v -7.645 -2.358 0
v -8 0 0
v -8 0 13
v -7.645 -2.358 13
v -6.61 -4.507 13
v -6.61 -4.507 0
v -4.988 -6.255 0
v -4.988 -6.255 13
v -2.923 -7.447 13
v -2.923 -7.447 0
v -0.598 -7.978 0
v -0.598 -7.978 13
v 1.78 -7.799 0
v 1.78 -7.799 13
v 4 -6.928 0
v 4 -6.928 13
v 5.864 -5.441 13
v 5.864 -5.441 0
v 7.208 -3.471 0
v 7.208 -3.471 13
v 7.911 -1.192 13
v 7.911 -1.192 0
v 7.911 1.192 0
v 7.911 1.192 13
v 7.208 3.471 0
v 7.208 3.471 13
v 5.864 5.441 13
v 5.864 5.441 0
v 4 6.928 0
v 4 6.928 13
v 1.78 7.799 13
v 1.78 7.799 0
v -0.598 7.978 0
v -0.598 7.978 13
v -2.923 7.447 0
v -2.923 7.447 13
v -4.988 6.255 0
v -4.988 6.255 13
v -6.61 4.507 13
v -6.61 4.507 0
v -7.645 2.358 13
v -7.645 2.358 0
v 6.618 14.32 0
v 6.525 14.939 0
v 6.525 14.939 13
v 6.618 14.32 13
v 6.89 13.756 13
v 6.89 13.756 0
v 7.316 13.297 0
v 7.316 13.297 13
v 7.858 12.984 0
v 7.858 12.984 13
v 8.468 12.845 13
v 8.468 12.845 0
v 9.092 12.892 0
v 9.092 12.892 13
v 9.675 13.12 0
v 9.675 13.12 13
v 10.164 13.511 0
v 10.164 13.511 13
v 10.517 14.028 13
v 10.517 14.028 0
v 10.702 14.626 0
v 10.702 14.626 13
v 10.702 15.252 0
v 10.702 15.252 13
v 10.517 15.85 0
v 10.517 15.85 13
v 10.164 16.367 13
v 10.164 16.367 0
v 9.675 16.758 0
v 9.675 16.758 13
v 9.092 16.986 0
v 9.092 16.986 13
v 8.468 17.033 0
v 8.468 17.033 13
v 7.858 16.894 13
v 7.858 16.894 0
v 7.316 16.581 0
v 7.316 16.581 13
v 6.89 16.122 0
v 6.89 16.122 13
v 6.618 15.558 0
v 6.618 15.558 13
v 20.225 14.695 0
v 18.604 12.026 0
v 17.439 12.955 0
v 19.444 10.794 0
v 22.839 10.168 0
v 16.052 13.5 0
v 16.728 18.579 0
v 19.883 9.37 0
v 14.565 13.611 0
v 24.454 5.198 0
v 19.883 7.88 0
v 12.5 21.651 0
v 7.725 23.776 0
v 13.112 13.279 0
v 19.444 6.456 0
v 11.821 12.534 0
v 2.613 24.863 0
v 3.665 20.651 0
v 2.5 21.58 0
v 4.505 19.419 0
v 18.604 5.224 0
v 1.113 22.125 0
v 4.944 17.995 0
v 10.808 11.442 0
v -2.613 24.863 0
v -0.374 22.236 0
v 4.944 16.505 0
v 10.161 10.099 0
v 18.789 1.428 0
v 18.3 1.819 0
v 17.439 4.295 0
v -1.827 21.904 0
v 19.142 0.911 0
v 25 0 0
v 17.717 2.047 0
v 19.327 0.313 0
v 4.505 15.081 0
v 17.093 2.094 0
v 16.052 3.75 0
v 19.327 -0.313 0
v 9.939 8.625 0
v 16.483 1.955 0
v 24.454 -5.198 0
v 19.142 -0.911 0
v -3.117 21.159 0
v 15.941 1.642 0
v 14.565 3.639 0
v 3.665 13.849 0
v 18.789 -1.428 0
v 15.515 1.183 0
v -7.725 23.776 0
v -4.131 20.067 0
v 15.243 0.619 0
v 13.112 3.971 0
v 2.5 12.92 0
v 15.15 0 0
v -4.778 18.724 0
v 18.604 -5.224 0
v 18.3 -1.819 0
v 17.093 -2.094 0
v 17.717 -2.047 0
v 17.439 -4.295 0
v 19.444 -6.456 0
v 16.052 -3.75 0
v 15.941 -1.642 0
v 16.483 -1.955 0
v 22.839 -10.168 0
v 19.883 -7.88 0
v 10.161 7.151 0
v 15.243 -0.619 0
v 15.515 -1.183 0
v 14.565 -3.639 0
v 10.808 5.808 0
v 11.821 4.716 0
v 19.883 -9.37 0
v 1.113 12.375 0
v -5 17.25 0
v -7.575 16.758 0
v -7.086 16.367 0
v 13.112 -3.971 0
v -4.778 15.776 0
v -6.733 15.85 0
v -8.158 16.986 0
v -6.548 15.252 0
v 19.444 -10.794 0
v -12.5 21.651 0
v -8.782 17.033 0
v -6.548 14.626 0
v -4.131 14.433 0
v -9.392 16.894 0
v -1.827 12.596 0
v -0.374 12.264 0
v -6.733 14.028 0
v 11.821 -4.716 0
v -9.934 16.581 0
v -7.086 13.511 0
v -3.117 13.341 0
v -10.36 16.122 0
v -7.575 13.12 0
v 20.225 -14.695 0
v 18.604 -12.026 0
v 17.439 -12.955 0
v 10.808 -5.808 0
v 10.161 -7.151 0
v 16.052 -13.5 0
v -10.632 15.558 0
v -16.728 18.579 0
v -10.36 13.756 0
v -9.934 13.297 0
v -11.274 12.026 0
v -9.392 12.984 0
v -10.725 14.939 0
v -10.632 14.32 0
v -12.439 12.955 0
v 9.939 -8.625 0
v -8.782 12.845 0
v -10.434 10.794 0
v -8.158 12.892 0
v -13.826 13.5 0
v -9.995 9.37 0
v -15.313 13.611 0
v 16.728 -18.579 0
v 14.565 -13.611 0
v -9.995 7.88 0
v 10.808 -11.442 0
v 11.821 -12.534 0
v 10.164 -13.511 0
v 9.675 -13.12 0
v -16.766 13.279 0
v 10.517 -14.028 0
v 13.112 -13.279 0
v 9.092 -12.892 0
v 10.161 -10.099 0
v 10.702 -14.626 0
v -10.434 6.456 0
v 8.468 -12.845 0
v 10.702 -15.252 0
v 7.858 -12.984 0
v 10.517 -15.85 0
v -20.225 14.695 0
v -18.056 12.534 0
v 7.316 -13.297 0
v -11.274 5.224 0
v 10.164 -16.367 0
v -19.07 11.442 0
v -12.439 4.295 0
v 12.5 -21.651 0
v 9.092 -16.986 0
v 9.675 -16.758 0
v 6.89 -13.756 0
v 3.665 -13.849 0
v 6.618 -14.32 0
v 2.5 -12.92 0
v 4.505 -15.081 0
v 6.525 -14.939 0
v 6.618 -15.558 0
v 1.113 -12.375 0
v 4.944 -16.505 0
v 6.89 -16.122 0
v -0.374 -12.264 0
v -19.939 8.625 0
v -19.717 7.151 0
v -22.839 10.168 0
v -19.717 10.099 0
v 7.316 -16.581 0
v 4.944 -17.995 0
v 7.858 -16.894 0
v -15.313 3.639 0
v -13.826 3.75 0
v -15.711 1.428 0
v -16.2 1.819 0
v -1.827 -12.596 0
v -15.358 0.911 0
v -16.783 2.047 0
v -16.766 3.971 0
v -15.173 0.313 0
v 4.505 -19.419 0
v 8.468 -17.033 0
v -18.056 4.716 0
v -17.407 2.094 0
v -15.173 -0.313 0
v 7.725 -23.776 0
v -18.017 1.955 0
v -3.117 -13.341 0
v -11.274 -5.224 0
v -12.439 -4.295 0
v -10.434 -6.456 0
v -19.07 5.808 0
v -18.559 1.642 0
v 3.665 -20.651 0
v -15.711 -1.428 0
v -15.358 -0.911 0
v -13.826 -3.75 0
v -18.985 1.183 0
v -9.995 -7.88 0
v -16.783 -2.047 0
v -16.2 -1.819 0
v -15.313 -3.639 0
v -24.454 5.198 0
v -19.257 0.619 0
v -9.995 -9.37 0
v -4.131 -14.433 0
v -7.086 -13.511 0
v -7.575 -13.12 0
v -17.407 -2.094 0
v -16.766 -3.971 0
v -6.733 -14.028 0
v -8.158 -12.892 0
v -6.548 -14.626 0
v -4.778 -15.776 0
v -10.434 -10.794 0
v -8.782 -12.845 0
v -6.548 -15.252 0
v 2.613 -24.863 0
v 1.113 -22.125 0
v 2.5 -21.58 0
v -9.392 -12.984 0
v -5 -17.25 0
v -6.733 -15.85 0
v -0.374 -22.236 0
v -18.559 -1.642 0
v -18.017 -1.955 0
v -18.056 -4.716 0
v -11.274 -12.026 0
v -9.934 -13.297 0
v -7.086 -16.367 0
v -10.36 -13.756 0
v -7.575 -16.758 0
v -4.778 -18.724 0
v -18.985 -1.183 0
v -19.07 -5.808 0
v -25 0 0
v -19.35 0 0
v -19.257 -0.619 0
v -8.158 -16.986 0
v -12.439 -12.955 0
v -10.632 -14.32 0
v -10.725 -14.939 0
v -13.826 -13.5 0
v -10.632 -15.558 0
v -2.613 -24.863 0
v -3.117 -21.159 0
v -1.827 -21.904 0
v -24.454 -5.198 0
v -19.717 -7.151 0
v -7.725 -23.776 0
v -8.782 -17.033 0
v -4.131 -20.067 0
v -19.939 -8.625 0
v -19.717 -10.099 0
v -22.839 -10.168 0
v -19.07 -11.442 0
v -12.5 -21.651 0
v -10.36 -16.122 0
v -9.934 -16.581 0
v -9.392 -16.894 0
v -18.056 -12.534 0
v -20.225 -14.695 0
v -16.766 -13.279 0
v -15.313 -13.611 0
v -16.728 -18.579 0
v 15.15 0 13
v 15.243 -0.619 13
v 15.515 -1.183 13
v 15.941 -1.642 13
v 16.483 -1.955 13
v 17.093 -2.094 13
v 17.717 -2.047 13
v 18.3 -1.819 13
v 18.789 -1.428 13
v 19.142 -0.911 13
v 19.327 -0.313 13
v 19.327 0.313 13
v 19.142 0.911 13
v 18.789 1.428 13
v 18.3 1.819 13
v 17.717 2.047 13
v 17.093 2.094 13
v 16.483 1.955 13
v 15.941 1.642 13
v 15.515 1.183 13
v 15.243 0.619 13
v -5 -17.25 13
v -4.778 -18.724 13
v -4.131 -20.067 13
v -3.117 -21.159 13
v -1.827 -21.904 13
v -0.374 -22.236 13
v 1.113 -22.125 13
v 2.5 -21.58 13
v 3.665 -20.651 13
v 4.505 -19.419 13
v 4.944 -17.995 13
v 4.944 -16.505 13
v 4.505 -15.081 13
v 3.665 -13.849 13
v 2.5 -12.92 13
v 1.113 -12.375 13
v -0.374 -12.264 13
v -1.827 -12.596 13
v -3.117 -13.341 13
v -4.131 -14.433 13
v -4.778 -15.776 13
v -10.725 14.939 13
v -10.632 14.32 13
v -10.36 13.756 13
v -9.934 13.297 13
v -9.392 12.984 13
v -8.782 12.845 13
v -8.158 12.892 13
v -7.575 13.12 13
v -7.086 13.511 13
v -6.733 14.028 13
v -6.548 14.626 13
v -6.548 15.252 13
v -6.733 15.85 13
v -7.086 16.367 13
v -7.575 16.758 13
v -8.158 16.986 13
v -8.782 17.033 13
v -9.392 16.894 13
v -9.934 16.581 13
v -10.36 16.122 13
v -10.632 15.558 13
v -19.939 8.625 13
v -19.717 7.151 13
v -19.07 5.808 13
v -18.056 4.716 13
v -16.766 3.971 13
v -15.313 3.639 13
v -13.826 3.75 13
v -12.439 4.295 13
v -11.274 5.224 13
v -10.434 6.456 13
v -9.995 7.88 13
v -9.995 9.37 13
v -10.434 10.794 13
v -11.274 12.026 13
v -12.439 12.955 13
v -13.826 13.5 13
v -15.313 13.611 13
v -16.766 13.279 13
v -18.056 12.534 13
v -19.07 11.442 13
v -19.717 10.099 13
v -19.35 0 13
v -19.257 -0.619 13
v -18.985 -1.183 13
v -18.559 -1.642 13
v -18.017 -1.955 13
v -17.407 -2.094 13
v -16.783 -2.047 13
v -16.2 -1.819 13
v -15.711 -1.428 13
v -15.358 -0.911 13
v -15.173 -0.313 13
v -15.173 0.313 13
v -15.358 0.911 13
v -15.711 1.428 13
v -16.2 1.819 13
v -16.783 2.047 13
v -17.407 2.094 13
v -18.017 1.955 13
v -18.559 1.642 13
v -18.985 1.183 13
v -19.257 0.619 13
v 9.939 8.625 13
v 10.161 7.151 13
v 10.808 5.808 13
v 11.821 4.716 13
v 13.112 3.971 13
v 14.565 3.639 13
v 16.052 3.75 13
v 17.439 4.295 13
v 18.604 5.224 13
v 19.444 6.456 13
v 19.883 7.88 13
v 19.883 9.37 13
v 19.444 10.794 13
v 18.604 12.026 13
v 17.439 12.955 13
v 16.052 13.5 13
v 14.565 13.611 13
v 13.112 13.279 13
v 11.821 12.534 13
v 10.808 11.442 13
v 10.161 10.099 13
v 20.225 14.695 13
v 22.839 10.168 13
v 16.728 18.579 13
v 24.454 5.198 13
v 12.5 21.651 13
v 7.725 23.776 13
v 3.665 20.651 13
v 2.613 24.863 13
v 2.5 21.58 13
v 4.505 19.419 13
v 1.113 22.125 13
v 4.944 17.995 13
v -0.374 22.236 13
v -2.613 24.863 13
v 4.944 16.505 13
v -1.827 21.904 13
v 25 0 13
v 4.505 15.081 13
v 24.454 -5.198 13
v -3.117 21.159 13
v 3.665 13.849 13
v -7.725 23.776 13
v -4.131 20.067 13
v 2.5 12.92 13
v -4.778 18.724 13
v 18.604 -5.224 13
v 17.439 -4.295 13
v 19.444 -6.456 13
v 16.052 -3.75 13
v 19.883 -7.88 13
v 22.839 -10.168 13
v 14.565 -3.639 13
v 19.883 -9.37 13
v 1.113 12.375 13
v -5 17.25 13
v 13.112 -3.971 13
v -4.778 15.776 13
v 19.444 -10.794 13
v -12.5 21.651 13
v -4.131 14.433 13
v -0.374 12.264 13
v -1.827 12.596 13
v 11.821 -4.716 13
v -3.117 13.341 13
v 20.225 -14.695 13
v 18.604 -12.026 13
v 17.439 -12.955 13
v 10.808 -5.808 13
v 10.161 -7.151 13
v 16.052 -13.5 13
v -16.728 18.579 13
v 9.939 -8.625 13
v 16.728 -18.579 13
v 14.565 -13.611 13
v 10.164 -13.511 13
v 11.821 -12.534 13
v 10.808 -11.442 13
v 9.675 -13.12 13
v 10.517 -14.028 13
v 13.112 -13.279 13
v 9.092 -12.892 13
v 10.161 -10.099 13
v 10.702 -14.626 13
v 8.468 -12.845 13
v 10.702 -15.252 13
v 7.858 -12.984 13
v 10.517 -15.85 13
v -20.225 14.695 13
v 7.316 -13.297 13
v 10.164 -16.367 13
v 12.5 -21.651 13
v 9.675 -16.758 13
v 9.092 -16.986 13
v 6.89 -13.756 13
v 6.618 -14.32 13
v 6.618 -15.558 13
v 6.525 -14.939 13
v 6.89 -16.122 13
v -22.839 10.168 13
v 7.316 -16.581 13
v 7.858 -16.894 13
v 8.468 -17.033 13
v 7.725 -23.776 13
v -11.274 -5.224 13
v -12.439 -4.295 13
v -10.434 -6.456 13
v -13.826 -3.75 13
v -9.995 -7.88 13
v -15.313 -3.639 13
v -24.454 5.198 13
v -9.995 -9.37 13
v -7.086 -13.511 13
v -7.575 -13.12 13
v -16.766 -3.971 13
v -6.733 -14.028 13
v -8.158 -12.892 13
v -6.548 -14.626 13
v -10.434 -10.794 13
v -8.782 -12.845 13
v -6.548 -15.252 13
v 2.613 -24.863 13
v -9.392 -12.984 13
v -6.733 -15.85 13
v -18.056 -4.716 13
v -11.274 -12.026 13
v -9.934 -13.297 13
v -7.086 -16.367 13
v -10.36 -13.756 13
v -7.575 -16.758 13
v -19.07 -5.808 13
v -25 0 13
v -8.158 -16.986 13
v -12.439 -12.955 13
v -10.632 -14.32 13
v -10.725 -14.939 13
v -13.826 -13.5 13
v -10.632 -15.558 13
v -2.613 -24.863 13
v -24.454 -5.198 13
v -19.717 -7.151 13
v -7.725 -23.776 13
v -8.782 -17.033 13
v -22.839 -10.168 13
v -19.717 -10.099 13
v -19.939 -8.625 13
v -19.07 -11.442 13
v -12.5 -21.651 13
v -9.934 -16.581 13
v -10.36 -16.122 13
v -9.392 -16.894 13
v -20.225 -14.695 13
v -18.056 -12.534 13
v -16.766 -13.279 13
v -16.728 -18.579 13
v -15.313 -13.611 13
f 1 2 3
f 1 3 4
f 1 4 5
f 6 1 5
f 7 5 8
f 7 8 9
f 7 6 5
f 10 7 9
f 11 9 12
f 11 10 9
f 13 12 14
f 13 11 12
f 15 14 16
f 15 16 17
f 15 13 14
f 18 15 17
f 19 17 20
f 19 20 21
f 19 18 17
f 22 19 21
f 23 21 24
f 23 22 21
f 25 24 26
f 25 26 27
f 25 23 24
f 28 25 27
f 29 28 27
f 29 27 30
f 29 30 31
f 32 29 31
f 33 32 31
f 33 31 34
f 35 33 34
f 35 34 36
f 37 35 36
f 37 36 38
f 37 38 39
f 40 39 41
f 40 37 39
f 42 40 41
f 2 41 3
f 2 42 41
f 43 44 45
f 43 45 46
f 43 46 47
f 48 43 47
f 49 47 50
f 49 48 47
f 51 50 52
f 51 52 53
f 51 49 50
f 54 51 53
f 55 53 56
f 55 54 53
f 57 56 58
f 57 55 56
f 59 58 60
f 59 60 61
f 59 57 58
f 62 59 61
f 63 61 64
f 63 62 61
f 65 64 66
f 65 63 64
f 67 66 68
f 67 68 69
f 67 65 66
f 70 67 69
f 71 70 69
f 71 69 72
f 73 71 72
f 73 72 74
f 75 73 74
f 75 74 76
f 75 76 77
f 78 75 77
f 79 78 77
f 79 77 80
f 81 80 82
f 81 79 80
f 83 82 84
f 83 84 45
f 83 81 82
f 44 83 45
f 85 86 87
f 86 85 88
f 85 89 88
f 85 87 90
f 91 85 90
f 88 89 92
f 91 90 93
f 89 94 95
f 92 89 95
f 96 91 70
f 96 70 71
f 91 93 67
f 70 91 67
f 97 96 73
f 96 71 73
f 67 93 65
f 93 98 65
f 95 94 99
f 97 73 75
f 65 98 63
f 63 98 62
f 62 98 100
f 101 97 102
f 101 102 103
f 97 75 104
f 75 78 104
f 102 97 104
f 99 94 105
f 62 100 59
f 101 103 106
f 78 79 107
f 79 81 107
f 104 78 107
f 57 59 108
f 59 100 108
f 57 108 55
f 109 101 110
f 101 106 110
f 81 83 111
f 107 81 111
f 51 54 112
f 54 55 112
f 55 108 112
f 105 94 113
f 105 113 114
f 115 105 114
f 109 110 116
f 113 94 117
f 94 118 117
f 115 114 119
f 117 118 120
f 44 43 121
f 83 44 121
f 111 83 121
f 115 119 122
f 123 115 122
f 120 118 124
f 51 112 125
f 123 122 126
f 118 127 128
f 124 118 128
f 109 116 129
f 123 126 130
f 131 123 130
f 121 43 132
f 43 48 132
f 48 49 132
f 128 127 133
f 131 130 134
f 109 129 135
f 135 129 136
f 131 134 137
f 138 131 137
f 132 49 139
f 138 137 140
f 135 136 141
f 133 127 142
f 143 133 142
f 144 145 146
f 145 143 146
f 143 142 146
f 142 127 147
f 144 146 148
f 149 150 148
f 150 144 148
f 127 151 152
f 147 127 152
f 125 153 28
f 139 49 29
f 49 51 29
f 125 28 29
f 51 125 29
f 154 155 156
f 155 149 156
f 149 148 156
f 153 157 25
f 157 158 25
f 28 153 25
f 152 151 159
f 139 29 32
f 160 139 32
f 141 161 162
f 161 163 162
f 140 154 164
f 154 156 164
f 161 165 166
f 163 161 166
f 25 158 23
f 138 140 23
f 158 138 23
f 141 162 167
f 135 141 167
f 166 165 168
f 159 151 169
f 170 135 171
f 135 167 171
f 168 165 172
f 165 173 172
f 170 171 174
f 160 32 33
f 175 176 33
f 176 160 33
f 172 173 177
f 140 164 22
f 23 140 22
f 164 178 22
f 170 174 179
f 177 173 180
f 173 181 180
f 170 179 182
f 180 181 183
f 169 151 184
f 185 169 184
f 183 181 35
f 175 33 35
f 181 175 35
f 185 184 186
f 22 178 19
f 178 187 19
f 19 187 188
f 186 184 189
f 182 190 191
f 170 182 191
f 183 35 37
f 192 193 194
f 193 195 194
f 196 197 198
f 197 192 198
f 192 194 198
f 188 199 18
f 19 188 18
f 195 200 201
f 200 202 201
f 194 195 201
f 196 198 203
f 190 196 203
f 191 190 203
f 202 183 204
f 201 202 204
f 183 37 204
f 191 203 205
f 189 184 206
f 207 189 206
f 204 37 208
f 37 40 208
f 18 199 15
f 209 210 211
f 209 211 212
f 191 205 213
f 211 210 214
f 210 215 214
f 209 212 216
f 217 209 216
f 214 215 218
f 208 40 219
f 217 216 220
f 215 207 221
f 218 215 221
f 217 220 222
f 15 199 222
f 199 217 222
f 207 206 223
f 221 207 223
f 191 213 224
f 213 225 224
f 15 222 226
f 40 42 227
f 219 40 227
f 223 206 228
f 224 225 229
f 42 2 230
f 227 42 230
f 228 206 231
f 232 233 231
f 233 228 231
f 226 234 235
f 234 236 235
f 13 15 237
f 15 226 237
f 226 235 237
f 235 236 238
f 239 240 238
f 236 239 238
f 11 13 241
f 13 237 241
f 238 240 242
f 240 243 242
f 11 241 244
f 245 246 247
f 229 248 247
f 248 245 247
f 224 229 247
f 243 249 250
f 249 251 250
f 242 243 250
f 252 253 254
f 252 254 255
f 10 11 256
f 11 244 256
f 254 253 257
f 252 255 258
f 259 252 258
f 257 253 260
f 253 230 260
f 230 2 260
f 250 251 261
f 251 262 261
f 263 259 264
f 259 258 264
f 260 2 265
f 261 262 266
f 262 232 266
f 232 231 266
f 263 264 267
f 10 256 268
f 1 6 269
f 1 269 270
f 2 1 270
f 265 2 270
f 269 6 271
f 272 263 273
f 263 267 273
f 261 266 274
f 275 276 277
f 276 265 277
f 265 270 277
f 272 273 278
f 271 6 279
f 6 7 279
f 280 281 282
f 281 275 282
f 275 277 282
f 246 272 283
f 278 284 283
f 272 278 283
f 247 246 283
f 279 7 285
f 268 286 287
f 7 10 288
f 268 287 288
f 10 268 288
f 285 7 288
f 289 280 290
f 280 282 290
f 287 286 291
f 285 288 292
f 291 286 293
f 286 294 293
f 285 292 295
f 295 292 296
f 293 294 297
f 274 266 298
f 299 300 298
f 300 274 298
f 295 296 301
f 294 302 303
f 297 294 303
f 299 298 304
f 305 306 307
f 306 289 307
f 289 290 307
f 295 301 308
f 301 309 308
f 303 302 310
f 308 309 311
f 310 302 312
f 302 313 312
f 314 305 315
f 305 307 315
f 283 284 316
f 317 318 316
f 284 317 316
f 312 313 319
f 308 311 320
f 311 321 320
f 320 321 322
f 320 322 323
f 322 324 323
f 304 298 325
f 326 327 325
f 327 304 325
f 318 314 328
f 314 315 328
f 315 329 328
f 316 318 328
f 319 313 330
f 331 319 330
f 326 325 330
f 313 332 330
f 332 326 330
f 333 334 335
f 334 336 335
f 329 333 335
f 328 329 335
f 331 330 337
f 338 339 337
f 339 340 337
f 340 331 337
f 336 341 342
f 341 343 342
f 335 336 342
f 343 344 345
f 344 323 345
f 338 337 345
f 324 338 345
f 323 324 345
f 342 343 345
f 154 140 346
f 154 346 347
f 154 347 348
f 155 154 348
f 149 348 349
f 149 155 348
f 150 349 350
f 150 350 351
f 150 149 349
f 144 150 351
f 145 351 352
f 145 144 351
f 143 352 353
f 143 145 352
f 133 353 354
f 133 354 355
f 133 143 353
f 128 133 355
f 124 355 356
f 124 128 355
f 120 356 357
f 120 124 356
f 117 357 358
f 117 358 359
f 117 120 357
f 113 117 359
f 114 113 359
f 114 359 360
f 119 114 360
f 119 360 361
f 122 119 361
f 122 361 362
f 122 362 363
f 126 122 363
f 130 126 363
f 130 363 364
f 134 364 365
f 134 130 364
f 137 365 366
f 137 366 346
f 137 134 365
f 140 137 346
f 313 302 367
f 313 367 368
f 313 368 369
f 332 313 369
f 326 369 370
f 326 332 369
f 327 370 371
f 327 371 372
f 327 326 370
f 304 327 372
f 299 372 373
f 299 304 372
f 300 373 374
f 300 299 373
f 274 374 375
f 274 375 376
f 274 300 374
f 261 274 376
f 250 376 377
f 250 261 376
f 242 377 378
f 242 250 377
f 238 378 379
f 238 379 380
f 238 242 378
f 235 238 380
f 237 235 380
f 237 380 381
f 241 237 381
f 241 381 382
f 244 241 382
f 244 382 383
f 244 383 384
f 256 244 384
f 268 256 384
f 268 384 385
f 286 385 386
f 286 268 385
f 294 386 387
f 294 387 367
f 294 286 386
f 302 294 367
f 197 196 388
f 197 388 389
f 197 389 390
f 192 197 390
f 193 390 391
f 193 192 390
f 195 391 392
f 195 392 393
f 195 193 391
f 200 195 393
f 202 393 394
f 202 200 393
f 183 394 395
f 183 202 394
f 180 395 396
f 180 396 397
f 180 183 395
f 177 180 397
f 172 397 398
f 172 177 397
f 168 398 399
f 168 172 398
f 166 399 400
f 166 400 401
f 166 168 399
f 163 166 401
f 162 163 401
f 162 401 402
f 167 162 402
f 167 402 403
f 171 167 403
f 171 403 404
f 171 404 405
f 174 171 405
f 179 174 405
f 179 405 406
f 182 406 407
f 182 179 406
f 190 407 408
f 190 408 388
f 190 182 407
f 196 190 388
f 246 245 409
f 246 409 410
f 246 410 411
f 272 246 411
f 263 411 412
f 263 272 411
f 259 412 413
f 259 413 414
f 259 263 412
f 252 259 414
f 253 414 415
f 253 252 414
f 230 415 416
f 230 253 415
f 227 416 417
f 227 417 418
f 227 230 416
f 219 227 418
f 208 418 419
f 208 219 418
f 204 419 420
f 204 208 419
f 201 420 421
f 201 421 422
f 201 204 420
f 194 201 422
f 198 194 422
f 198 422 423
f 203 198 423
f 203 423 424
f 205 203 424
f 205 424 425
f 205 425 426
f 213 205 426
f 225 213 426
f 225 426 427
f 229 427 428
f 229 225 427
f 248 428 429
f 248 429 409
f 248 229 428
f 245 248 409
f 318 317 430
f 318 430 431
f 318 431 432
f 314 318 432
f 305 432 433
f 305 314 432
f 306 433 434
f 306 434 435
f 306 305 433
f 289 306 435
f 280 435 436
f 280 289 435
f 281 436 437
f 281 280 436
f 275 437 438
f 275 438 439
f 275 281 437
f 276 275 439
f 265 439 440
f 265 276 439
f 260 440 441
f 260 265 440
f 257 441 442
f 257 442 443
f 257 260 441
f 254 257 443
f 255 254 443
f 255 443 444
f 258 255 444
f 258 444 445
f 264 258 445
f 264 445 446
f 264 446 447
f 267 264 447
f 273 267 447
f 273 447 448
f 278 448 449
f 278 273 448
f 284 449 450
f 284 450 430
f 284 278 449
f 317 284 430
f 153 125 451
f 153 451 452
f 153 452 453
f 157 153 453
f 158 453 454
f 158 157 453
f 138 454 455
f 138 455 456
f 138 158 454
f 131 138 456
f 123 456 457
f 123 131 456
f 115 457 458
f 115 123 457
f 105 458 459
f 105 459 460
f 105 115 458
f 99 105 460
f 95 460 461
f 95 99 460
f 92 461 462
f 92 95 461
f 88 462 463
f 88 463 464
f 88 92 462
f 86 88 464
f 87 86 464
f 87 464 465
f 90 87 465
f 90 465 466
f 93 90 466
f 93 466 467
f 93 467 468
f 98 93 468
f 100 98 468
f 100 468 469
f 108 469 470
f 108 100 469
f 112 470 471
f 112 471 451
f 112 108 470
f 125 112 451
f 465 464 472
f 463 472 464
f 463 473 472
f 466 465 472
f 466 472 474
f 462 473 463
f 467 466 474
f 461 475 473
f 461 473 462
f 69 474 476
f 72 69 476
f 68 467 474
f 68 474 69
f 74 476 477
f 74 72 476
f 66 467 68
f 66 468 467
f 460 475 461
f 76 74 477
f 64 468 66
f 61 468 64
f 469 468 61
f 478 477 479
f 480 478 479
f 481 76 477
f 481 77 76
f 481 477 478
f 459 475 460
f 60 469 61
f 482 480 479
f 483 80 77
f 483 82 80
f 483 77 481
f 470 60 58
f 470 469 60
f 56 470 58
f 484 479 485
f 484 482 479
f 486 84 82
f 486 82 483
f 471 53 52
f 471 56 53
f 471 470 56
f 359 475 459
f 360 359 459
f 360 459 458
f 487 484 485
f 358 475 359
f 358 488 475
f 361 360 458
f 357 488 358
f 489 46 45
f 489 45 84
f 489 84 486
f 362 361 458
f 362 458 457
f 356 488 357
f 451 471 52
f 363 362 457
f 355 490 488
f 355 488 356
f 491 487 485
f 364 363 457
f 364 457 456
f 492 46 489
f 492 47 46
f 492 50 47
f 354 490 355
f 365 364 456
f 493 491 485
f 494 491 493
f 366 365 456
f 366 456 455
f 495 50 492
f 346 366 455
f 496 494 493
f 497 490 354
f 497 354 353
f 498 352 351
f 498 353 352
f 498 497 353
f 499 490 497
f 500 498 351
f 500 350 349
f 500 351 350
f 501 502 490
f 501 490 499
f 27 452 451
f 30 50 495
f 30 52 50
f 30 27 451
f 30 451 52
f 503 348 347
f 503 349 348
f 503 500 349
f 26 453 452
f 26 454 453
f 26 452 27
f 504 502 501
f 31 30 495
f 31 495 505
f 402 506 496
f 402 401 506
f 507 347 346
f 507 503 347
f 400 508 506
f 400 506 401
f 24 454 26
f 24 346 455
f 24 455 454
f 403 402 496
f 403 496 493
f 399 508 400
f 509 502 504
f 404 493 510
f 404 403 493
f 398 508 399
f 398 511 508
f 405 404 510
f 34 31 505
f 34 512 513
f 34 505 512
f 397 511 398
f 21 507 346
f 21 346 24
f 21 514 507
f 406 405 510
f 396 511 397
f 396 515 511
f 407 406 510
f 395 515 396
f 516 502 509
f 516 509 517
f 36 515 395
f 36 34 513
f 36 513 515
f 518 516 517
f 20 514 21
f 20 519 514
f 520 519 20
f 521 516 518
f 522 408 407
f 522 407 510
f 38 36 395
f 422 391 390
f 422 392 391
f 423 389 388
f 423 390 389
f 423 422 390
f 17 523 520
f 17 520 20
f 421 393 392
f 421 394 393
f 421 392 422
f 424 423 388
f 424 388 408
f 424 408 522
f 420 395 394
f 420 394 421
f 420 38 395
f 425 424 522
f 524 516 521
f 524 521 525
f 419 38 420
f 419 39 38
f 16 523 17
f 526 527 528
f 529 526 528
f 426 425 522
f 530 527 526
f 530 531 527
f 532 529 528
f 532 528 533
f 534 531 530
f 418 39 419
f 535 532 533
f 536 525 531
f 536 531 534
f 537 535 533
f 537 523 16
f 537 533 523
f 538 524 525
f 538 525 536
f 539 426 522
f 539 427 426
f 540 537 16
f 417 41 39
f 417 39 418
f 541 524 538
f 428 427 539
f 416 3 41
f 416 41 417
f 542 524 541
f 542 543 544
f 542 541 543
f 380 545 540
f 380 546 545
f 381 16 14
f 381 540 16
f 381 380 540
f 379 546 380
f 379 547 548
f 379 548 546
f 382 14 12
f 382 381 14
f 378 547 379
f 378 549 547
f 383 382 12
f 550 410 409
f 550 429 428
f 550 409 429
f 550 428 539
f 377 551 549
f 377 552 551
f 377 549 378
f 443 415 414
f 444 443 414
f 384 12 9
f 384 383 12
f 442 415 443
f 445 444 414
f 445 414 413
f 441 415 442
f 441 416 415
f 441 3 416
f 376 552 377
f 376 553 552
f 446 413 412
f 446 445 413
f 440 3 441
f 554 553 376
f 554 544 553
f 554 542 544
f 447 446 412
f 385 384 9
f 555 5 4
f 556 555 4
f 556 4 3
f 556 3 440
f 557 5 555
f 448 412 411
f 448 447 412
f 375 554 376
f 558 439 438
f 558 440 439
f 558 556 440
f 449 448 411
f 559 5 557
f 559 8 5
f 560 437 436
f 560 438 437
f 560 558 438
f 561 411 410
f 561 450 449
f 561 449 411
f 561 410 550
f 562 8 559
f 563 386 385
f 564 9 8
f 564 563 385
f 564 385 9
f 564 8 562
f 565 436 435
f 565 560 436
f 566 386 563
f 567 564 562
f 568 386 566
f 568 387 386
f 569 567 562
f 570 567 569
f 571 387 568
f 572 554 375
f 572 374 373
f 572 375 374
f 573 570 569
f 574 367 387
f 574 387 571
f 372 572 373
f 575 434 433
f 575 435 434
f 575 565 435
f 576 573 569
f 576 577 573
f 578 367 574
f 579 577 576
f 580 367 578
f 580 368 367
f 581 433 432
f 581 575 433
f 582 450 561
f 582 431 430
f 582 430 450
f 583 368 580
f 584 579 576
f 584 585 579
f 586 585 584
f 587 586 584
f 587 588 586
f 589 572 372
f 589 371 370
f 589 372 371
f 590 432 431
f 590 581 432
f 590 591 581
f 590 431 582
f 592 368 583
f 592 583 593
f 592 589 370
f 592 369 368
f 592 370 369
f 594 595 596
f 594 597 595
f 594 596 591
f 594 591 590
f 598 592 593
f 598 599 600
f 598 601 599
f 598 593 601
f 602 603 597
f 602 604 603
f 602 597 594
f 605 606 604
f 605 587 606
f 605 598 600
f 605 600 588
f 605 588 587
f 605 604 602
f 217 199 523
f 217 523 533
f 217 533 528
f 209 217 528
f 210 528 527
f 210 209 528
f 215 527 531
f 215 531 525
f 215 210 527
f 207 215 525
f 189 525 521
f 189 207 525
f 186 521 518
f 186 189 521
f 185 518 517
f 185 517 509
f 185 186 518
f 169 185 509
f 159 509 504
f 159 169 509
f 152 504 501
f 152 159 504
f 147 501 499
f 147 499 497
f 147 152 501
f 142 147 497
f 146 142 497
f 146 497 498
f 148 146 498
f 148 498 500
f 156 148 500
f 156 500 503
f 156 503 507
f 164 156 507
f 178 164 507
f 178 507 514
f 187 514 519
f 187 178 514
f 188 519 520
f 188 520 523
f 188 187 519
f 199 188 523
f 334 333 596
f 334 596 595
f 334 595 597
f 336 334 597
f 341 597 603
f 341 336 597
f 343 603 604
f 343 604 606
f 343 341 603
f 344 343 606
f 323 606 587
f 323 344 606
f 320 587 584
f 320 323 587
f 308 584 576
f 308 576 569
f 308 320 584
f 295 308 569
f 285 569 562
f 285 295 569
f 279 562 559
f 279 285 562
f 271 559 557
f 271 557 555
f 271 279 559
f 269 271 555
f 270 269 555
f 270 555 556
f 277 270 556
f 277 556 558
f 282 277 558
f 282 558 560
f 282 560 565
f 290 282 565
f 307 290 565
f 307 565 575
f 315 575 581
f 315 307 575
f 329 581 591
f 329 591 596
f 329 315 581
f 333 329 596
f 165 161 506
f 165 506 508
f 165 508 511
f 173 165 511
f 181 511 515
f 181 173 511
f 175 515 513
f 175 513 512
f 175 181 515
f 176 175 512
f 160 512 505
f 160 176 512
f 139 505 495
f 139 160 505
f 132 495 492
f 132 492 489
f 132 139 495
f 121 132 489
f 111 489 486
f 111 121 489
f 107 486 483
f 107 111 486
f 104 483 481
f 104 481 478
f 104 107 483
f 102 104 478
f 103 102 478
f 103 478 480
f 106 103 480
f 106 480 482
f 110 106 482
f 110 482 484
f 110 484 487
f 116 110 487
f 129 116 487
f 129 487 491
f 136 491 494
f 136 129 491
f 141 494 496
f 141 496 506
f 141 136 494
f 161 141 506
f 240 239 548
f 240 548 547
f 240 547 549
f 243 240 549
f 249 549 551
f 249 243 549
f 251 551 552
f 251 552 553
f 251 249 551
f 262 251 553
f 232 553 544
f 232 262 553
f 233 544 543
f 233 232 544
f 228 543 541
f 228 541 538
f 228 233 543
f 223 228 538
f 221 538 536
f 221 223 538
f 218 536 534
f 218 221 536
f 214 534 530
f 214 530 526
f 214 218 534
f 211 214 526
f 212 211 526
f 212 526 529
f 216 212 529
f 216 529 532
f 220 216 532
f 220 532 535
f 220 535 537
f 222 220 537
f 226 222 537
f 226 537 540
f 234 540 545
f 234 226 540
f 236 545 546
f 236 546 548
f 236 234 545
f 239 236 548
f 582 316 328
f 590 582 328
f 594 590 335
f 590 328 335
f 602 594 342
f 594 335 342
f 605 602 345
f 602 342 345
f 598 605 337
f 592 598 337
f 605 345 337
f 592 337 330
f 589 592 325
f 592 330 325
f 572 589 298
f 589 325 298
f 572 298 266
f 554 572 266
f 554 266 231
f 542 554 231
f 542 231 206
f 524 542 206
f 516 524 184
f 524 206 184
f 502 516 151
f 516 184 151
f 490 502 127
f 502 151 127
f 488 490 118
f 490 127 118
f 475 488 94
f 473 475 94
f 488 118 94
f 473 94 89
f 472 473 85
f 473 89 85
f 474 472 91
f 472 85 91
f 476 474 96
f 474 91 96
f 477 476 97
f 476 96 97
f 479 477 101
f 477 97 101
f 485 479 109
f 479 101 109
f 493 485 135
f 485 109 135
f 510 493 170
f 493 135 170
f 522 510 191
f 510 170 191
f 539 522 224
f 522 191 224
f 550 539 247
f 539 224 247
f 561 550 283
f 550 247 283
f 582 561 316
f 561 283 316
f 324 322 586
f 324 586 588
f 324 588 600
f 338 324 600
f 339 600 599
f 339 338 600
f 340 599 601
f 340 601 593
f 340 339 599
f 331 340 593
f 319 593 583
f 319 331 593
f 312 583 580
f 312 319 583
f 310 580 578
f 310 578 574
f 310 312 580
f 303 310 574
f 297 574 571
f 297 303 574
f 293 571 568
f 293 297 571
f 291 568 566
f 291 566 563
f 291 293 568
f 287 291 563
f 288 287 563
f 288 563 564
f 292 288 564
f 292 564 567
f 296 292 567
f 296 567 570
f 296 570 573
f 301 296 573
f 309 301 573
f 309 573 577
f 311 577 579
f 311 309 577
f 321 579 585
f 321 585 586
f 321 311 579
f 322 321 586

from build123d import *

# Parameters (mm, degrees)
SKETCH_1_R      = 25
SKETCH_1_R_2    = 8
SKETCH_1_R_3    = 2.1
SKETCH_1_R_4    = 5
EXTRUDE_2_DEPTH = 13


with BuildPart() as part:
    # 草图1 → 凸台-拉伸2 (new body)
    with BuildSketch(Plane.XY):
        with Locations(Location((0, 0, 0), (0, 0, 180))):
            Circle(SKETCH_1_R)
        with Locations(Location((0, 0, 0), (0, 0, 180))):
            Circle(SKETCH_1_R_2, mode=Mode.SUBTRACT)
        with Locations(Location((8.625, 14.938938215, 0), (0, 0, 180))):
            Circle(SKETCH_1_R_3, mode=Mode.SUBTRACT)
        with Locations(Location((17.25, 0, 0), (0, 0, 180))):
            Circle(SKETCH_1_R_3, mode=Mode.SUBTRACT)
        with Locations(Location((8.625, -14.938938215, 0), (0, 0, 180))):
            Circle(SKETCH_1_R_3, mode=Mode.SUBTRACT)
        with Locations(Location((-8.625, -14.938938215, 0), (0, 0, 180))):
            Circle(SKETCH_1_R_3, mode=Mode.SUBTRACT)
        with Locations(Location((-17.25, 0, 0), (0, 0, 180))):
            Circle(SKETCH_1_R_3, mode=Mode.SUBTRACT)
        with Locations(Location((-8.625, 14.938938215, 0), (0, 0, 180))):
            Circle(SKETCH_1_R_3, mode=Mode.SUBTRACT)
        with Locations(Location((0, 17.25, 0), (0, 0, 180))):
            Circle(SKETCH_1_R_4, mode=Mode.SUBTRACT)
        with Locations(Location((14.938938215, 8.625, 0), (0, 0, 180))):
            Circle(SKETCH_1_R_4, mode=Mode.SUBTRACT)
        with Locations(Location((14.938938215, -8.625, 0), (0, 0, 180))):
            Circle(SKETCH_1_R_4, mode=Mode.SUBTRACT)
        with Locations(Location((-14.938938215, -8.625, 0), (0, 0, 180))):
            Circle(SKETCH_1_R_4, mode=Mode.SUBTRACT)
        with Locations(Location((-14.938938215, 8.625, 0), (0, 0, 180))):
            Circle(SKETCH_1_R_4, mode=Mode.SUBTRACT)
        with Locations(Location((0, -17.25, 0), (0, 0, 180))):
            Circle(SKETCH_1_R_4, mode=Mode.SUBTRACT)
    extrude(amount=EXTRUDE_2_DEPTH)


solid = part.part
